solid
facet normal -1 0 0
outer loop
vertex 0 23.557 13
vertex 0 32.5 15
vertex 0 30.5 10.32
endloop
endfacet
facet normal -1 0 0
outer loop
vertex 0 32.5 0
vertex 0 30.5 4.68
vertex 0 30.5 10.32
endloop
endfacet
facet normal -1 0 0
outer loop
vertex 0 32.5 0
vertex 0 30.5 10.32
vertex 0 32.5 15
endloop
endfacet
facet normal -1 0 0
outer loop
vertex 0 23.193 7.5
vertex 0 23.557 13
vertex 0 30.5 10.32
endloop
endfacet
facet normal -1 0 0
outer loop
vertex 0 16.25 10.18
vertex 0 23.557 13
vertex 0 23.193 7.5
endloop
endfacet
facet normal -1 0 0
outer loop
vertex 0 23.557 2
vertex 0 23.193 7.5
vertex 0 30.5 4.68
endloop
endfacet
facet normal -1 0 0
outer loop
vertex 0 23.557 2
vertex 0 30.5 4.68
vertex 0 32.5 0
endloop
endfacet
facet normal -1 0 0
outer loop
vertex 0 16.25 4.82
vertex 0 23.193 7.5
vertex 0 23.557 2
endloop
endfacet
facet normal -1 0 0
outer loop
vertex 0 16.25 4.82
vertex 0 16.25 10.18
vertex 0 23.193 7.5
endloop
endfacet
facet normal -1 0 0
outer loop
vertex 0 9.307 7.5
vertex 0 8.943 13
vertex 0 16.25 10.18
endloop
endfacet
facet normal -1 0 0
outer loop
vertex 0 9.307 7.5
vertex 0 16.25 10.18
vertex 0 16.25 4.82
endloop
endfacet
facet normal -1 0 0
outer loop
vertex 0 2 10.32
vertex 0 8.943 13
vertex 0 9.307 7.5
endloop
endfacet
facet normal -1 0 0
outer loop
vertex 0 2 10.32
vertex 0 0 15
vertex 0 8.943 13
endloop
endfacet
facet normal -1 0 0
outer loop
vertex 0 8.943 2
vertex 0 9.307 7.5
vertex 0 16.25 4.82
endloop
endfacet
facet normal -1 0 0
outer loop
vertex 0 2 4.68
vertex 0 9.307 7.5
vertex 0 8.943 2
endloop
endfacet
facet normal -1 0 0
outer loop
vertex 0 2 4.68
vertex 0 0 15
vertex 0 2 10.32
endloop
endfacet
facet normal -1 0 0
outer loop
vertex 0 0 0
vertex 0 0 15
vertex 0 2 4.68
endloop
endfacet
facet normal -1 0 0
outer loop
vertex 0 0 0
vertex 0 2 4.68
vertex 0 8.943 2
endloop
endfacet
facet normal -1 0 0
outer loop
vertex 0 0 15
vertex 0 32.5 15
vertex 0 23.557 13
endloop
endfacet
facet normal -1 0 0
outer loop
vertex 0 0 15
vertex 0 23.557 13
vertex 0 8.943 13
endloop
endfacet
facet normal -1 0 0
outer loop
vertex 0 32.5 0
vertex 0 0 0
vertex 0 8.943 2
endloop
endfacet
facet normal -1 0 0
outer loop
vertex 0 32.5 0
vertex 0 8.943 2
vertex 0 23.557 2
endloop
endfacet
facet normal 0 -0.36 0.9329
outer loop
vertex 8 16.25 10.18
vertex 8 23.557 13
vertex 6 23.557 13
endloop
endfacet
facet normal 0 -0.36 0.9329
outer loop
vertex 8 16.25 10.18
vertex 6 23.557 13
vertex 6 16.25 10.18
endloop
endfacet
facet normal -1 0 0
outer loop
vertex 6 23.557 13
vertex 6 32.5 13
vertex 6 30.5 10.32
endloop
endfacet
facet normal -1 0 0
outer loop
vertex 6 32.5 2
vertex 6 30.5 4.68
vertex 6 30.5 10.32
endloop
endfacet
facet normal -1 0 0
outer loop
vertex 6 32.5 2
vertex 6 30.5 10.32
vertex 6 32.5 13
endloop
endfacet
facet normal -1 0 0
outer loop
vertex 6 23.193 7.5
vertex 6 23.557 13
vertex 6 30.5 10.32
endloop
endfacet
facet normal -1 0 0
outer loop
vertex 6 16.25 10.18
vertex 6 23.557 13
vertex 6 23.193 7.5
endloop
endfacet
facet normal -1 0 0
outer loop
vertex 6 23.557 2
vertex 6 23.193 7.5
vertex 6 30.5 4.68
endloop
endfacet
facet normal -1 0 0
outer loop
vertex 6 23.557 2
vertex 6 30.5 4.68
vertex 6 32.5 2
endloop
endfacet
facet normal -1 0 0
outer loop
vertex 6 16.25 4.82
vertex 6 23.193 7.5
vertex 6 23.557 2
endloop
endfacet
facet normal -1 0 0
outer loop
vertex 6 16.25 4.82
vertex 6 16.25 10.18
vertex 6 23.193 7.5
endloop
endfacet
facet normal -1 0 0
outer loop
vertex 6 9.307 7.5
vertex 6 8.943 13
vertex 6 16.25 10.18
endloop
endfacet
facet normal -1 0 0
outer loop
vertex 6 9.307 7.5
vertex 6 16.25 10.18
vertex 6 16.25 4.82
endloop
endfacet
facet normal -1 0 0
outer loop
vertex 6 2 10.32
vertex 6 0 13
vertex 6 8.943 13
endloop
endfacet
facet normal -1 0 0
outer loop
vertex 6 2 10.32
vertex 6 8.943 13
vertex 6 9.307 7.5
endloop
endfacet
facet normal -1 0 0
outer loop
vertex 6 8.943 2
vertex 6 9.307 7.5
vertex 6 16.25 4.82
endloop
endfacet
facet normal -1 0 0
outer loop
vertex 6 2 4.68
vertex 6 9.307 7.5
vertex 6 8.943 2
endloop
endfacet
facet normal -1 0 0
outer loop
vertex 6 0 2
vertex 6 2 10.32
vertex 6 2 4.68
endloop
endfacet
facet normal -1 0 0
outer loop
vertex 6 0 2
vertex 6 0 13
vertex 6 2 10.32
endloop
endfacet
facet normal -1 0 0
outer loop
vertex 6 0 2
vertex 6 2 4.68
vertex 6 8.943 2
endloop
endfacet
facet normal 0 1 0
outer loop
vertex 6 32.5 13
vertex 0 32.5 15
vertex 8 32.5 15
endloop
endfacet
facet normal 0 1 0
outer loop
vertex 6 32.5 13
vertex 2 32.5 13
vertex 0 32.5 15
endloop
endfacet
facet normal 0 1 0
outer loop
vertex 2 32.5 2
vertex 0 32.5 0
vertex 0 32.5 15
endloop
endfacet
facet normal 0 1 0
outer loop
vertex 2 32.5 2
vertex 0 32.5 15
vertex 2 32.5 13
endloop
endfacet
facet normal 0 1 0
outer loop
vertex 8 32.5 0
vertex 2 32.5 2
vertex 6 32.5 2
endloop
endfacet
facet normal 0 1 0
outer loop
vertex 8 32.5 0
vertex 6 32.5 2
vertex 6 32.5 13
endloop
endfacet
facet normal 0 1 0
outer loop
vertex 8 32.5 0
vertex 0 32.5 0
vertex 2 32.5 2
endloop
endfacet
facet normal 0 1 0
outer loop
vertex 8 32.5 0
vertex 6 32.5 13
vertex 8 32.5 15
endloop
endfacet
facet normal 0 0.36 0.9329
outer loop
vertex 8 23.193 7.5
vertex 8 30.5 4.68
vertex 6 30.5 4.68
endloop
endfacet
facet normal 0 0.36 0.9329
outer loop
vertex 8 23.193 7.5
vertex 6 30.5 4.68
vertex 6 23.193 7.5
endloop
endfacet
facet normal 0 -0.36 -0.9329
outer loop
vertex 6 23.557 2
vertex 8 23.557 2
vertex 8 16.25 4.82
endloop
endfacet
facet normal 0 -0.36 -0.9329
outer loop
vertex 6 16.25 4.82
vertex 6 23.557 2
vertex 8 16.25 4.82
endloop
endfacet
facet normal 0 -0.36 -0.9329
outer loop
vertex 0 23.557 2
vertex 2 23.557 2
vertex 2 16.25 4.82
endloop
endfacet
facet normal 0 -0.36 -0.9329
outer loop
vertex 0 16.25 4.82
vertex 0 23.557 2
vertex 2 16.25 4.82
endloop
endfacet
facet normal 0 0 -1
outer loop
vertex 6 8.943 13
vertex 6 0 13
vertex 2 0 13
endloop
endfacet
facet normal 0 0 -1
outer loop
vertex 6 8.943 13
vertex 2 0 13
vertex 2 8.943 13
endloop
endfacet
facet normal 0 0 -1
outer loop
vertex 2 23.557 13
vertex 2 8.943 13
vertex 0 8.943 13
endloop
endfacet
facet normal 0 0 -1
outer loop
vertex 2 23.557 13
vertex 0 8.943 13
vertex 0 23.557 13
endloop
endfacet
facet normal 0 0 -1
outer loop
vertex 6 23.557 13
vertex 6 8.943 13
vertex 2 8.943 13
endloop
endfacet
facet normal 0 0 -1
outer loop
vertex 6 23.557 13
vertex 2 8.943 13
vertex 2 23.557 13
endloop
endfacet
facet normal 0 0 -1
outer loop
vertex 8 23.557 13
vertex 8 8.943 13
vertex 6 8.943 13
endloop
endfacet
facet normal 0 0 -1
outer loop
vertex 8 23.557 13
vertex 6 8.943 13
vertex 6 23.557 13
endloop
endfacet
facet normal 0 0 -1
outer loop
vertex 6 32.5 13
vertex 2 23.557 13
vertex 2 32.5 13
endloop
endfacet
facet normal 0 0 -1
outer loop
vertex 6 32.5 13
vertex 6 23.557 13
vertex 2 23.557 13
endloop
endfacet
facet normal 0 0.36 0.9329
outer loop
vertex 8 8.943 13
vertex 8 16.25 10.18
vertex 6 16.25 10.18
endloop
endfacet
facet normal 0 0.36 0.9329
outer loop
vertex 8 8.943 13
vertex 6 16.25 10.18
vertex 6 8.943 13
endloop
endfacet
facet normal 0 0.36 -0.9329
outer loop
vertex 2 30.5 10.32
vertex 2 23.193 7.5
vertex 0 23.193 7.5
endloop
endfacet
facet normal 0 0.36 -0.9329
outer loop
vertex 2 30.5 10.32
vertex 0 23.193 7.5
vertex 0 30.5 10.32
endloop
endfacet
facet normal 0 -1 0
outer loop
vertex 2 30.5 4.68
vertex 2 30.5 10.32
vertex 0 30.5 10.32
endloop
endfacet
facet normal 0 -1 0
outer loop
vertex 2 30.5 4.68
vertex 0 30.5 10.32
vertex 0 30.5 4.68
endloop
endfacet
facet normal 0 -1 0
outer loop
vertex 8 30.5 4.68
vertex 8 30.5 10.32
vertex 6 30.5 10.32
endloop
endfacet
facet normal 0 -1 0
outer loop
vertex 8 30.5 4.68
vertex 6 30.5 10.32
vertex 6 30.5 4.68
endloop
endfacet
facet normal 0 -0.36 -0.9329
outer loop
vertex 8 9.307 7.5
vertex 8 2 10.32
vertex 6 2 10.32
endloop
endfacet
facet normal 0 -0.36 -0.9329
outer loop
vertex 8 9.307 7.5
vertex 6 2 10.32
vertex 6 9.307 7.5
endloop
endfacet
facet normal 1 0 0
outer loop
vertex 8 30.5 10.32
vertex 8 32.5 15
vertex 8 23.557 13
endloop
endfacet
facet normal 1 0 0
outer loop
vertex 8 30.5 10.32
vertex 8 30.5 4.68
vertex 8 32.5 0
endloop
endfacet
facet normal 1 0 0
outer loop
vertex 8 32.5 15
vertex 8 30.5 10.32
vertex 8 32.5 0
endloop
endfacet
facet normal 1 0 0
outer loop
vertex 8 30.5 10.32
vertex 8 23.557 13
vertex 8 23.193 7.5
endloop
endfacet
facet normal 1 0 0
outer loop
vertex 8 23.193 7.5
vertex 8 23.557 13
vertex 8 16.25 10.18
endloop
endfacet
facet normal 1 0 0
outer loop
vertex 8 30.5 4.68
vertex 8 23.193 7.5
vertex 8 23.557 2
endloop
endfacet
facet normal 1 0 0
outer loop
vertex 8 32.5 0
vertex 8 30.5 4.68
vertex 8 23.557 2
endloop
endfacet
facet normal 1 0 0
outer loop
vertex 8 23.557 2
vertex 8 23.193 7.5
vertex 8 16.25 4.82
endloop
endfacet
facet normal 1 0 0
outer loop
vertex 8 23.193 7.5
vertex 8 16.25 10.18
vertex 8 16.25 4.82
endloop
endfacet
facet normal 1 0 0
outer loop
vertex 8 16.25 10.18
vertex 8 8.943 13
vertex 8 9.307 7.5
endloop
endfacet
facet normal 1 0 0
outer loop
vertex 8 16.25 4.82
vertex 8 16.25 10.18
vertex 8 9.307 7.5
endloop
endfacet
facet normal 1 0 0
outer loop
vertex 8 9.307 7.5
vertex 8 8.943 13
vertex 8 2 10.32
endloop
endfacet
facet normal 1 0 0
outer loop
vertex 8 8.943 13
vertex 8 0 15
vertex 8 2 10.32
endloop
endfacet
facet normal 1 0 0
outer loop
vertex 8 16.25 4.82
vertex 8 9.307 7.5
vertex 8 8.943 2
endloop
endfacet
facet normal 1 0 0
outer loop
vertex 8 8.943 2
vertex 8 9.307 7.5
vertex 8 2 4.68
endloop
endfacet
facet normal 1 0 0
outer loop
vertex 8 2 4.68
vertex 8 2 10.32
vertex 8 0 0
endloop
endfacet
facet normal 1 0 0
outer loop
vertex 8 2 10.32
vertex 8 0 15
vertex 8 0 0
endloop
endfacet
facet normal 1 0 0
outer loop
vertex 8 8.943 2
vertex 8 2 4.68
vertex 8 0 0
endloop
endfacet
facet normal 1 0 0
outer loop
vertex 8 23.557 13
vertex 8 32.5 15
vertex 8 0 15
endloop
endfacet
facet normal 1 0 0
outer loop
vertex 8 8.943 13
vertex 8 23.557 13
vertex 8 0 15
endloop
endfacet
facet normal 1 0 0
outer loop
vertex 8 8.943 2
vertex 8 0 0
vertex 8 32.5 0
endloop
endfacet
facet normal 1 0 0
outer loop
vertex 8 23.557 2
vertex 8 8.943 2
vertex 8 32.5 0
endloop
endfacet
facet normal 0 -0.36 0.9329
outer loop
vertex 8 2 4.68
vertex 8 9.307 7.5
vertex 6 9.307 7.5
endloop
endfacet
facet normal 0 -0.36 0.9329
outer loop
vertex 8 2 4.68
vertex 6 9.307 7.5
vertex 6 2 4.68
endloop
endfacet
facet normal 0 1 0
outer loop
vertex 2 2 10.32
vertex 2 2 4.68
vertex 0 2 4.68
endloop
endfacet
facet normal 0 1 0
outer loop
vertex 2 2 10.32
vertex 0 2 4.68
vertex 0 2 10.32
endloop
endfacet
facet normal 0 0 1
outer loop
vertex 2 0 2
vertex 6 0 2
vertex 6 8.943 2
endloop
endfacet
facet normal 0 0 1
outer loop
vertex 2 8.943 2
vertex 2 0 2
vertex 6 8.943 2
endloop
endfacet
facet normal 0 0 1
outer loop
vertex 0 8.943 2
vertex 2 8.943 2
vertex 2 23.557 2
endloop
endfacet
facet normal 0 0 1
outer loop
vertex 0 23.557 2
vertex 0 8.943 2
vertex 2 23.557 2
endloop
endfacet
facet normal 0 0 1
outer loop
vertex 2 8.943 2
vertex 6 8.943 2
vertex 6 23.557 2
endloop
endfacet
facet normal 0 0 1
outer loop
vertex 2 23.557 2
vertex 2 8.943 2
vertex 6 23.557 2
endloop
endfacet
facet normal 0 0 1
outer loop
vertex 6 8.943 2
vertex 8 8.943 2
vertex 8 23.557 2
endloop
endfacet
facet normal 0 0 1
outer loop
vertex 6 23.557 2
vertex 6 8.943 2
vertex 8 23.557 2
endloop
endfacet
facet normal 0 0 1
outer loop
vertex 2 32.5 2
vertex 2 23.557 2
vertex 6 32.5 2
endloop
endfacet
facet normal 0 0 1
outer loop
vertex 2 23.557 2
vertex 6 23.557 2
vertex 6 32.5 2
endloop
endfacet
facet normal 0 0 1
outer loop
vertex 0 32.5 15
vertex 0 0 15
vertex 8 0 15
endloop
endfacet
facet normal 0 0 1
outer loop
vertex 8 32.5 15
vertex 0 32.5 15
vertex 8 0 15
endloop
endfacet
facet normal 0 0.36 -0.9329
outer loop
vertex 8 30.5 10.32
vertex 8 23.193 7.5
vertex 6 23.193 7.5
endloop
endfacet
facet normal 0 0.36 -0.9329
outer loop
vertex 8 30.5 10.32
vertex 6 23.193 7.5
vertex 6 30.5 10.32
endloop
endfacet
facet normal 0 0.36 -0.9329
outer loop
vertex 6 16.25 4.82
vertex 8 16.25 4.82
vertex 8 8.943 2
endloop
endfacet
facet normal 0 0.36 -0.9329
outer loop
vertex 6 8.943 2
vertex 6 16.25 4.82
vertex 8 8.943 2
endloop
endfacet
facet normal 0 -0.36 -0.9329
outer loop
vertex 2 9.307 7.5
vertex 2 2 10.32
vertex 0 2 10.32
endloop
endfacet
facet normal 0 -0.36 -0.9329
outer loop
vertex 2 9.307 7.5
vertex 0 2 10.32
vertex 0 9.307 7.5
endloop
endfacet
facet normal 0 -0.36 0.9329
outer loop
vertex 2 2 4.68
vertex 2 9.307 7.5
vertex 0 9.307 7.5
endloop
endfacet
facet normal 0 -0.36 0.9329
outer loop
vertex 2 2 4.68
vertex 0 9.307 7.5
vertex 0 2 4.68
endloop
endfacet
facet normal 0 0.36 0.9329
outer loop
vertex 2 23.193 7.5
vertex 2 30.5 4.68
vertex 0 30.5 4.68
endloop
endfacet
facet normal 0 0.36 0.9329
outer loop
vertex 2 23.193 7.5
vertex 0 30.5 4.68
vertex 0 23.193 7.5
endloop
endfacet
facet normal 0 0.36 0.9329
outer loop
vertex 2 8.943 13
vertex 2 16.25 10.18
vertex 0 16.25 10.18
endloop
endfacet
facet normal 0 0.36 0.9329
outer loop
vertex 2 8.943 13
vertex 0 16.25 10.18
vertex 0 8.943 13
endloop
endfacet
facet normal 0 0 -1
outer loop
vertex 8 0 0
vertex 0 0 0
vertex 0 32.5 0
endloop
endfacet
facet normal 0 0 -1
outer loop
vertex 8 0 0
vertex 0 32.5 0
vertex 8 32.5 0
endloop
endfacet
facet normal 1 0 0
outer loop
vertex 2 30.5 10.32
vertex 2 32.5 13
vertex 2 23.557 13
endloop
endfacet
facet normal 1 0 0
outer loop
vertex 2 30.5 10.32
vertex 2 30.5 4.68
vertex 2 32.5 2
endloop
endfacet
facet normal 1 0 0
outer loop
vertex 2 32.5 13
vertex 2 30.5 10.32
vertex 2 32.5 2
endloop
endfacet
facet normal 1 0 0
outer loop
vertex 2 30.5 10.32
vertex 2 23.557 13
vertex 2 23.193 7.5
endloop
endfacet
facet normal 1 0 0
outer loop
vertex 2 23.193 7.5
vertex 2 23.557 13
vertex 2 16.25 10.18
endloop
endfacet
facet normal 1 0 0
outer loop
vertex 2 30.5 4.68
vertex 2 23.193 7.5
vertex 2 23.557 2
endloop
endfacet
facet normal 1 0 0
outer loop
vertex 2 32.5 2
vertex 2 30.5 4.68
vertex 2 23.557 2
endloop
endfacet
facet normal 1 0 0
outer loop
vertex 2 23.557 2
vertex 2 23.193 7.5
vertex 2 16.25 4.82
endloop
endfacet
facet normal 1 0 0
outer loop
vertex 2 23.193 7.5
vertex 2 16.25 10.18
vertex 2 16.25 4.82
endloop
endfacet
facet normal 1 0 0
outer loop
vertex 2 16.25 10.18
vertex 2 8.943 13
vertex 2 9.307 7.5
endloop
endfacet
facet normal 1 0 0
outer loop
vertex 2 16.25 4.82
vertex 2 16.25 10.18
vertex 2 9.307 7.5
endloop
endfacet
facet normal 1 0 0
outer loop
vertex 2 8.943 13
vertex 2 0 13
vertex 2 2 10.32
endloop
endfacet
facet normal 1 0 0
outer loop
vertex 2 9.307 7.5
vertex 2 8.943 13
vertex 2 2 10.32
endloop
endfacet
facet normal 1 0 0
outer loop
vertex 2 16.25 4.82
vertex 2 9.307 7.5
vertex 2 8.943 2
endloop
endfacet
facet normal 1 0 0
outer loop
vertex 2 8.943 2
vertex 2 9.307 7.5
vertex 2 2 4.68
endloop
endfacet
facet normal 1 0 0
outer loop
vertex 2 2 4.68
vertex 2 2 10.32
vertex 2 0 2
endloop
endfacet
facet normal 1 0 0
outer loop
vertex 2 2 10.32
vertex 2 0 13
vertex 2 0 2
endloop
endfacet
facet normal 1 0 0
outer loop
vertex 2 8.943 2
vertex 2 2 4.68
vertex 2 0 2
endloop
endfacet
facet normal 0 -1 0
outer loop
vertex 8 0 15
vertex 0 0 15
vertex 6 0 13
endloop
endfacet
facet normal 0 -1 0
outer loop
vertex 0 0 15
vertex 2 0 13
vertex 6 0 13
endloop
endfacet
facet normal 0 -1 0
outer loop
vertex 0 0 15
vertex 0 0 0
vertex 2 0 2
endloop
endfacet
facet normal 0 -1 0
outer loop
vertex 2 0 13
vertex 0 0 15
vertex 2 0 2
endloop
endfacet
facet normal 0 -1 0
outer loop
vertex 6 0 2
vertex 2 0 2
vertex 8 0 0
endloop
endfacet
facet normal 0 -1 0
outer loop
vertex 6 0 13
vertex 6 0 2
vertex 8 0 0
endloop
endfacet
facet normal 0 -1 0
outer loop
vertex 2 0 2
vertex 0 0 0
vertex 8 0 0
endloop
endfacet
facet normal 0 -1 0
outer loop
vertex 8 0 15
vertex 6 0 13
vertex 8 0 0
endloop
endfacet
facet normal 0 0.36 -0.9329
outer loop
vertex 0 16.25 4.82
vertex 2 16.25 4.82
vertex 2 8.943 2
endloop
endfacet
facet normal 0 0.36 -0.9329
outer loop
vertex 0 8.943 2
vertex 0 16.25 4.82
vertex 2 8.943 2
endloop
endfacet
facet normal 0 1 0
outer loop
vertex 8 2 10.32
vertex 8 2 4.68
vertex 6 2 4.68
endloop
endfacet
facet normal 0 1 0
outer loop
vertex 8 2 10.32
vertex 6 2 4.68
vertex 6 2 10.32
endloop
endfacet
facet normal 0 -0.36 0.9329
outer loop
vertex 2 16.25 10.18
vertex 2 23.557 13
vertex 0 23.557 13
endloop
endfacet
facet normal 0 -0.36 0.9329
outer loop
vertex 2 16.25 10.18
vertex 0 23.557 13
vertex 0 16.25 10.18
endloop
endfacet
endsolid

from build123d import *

# Parameters (mm, degrees)
SKETCH1_W           = 8
SKETCH1_H           = 15
SKETCH1_W_2         = 4
SKETCH1_H_2         = 11
BOSS_EXTRUDE1_DEPTH = 32.5
CUT_EXTRUDE1_DEPTH  = 37.67764987


with BuildPart() as part:
    # Sketch1 → Boss-Extrude1 (new body)
    with BuildSketch(Plane(origin=(0, 0, 0), x_dir=(1, 0, 0), z_dir=(0, 1, 0))):
        with Locations((4, -7.5)):
            Rectangle(SKETCH1_W, SKETCH1_H)
        with Locations((4, -7.5)):
            Rectangle(SKETCH1_W_2, SKETCH1_H_2, mode=Mode.SUBTRACT)
    extrude(amount=BOSS_EXTRUDE1_DEPTH)

    # Sketch2 → Cut-Extrude1 (cut, through all)
    with BuildSketch(Plane(origin=(8, 0, 0), x_dir=(0, 0, -1), z_dir=(1, 0, 0))):
        Polygon((-10.320250812, 30.5), (-4.679749188, 30.5), (-7.5, 23.192986532), align=None)
        Polygon((-13, 23.557013468), (-10.179749188, 16.25), (-13, 8.942986532), align=None)
        Polygon((-2, 23.557013468), (-4.820250812, 16.25), (-2, 8.942986532), align=None)
        Polygon((-7.5, 9.307013468), (-4.679749188, 2), (-10.320250812, 2), align=None)
    extrude(amount=-CUT_EXTRUDE1_DEPTH, mode=Mode.SUBTRACT)


solid = part.part
